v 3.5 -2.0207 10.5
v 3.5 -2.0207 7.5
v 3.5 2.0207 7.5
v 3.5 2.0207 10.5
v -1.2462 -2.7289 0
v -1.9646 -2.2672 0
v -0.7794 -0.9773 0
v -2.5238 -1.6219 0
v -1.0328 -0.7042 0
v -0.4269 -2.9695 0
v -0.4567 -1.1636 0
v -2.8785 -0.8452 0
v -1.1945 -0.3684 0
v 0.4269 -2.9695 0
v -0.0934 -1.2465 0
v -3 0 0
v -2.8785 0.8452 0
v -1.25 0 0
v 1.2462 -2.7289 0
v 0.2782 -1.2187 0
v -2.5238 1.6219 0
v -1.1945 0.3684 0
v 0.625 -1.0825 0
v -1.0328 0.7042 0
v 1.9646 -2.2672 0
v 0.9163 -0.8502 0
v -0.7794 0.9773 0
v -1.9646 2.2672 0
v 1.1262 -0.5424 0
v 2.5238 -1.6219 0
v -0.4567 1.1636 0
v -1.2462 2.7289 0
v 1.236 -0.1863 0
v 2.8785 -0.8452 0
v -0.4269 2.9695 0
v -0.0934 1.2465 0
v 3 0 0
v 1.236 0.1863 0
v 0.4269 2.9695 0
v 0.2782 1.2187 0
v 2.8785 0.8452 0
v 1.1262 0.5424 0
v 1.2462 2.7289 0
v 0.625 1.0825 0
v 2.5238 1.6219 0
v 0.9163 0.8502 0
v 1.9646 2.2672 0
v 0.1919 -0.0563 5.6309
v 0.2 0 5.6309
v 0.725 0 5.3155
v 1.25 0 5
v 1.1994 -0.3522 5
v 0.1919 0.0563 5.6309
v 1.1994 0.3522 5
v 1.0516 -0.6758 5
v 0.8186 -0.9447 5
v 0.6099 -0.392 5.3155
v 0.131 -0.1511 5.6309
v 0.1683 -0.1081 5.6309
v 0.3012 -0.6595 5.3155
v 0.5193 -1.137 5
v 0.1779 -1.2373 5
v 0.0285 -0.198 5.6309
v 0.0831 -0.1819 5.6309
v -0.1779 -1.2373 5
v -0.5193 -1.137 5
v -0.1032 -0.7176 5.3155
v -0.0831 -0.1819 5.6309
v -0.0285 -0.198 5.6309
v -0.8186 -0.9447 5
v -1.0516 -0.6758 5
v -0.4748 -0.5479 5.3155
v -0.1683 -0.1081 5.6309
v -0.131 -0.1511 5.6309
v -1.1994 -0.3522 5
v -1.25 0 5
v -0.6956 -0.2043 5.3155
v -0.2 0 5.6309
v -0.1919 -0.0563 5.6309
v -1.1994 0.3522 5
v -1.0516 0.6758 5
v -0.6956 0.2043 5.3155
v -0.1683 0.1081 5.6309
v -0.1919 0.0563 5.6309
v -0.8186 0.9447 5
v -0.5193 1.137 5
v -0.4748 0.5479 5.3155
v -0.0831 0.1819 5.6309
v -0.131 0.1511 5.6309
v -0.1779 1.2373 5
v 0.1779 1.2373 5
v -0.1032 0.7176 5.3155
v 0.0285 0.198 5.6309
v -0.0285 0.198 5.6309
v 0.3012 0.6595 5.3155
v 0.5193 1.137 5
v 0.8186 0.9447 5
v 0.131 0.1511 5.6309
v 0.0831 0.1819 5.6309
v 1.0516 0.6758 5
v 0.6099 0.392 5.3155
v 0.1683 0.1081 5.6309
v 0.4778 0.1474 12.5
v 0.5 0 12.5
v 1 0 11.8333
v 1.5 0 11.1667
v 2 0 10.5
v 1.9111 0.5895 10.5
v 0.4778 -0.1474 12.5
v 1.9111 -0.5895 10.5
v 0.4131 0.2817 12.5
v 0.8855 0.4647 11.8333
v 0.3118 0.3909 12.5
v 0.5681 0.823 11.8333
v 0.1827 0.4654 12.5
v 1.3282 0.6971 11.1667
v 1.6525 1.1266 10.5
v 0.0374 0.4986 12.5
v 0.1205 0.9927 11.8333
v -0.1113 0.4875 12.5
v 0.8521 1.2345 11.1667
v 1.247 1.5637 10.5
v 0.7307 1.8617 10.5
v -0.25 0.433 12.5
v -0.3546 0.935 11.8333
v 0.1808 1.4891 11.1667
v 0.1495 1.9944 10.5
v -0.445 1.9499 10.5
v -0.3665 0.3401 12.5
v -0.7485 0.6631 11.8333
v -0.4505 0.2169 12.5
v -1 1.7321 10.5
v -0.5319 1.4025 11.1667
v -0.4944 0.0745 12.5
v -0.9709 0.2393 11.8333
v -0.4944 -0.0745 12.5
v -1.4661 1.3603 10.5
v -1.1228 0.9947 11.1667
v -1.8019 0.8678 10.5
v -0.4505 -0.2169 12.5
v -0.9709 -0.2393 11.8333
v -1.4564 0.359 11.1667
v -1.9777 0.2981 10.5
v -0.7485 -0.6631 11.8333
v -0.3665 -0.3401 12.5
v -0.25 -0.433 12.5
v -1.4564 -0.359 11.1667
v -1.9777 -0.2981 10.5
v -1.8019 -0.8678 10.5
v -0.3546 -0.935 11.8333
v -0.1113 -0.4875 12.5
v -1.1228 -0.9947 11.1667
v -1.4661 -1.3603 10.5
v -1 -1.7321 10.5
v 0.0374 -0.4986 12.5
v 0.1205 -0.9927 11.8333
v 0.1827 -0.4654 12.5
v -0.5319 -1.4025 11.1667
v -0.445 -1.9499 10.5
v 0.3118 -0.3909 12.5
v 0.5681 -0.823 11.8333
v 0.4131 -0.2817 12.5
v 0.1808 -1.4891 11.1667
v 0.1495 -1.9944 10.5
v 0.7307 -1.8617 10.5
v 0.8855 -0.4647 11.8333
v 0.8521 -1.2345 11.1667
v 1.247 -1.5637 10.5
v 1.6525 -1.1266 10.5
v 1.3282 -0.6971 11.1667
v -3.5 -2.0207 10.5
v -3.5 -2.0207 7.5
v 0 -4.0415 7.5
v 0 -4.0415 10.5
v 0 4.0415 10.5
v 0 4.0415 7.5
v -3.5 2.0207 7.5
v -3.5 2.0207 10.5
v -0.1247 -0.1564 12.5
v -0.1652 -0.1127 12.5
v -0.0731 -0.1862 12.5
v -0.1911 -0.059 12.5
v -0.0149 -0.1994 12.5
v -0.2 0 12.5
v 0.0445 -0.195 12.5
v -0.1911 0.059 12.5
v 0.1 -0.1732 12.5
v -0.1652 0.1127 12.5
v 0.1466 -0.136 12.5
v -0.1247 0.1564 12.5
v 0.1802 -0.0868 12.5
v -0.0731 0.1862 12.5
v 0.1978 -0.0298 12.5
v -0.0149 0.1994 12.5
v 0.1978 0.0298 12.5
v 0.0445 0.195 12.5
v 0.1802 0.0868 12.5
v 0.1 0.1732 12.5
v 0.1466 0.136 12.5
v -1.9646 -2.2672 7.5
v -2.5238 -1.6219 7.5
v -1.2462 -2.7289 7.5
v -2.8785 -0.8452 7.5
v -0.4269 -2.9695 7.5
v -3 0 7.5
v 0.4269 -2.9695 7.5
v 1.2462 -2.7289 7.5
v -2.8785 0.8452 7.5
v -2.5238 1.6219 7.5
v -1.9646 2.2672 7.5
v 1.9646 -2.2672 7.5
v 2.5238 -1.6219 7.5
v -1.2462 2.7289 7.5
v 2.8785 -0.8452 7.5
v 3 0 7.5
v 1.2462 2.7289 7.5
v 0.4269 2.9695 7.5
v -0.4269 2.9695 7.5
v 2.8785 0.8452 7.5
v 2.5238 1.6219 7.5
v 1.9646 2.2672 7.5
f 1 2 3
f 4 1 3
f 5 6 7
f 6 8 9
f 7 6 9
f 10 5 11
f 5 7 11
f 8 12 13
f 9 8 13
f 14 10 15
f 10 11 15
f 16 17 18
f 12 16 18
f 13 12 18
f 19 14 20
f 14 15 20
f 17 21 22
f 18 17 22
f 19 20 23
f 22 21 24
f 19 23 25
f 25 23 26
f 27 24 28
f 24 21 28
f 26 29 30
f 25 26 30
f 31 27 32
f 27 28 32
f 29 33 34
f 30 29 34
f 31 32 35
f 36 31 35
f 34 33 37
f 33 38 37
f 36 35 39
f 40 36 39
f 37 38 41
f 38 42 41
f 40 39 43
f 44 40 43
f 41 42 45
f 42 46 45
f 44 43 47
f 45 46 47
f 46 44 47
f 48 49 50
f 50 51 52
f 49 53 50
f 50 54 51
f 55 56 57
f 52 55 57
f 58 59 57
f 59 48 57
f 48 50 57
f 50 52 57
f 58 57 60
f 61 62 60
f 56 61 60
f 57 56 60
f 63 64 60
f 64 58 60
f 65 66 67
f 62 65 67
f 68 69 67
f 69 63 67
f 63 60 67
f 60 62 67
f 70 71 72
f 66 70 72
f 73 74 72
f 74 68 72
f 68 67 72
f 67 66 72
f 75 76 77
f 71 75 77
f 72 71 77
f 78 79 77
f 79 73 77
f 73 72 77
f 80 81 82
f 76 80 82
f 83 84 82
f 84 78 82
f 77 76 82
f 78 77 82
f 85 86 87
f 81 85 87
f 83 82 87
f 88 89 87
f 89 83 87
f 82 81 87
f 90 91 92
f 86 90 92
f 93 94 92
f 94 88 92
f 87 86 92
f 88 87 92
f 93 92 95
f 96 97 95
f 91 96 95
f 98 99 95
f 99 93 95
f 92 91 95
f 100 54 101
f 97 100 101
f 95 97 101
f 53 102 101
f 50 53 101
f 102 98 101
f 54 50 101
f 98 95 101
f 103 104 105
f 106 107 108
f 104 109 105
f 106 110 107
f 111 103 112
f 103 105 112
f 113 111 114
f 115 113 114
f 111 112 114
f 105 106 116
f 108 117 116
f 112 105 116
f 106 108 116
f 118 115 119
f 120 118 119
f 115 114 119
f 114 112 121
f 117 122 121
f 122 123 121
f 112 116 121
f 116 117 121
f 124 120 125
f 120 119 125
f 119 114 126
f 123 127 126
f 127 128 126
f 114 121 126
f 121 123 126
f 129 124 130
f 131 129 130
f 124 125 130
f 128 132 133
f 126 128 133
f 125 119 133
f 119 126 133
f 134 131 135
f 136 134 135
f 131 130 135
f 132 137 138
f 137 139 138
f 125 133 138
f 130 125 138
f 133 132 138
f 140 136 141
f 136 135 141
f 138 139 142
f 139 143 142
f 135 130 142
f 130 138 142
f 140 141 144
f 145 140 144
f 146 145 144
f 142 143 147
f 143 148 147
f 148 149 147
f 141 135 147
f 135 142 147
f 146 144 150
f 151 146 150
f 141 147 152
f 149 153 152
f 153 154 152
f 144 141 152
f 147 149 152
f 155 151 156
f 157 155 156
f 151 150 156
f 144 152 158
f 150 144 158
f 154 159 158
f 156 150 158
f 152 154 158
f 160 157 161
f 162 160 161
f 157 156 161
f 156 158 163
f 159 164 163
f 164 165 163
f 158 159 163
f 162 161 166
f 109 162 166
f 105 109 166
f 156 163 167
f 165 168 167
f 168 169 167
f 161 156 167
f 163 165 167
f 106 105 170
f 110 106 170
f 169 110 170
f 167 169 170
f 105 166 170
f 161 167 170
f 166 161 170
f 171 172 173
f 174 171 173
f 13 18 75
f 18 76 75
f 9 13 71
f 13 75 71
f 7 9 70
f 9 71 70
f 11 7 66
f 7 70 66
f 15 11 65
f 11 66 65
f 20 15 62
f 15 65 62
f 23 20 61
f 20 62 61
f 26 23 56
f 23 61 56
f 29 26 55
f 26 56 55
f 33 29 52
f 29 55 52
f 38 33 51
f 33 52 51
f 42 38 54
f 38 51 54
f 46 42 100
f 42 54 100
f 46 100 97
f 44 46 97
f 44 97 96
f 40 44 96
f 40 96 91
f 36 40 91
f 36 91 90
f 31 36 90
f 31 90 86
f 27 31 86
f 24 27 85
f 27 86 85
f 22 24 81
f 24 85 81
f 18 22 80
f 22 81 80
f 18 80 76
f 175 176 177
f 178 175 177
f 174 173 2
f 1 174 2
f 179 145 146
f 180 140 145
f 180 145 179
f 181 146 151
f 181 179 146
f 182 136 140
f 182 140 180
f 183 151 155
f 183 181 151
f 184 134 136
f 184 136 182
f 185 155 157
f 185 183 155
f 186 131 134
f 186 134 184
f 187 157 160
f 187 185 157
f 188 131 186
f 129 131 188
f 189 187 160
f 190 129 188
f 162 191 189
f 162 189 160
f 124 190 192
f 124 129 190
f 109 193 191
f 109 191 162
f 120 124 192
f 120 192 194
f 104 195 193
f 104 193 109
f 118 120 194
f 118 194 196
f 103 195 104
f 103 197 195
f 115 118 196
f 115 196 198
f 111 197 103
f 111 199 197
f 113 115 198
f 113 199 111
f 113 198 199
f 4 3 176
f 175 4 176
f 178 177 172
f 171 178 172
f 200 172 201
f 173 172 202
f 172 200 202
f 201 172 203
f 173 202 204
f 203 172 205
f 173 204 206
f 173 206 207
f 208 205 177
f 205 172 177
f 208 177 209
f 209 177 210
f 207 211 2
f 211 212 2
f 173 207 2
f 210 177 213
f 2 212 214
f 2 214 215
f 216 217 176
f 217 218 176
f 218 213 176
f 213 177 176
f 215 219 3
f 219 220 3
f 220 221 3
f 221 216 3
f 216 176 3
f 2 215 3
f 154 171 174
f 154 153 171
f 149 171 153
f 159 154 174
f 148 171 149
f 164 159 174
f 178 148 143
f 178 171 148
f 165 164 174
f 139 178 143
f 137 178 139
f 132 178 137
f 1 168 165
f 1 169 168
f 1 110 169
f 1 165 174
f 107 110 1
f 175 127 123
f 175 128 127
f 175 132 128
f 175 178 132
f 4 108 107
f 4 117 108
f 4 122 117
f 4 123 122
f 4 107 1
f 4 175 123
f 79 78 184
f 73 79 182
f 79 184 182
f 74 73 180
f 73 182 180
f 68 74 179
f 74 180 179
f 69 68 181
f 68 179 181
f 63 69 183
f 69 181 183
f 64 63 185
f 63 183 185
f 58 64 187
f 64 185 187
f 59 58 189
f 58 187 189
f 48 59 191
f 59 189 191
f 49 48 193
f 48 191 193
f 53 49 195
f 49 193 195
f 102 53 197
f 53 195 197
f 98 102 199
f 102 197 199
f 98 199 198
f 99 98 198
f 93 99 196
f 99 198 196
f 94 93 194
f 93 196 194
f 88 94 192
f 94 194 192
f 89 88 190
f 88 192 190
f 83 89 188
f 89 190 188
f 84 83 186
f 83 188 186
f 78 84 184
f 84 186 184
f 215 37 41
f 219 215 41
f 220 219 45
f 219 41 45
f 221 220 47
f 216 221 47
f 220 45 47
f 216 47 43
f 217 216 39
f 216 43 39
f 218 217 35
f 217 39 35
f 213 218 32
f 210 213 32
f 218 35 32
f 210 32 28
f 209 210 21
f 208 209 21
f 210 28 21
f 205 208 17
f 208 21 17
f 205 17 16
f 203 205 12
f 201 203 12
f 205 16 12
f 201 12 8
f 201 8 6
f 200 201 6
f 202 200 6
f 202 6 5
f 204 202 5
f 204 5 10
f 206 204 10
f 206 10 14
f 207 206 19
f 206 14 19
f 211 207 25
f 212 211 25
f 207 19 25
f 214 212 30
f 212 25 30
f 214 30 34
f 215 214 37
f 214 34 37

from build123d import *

# Parameters (mm, degrees)
F1_R      = 3
F2_DEPTH  = 7.5
F3_R      = 3
F4_DEPTH  = 3
F5_R      = 2
F6_DEPTH  = 2
F7_SIZE2  = 1.99999
F7_SIZE   = 1.49999
F8_D      = 0.4
F10_D     = 2.5
F10_DEPTH = 5
F10_TIP   = 0.7510757738


# Not quite as in the source:
# - a fillet or chamfer is up to 0.001 mm smaller than in the source, because OpenCascade refuses the exact size


with BuildPart() as f2:
    # F1 (on face) → F2 (new body)
    with BuildSketch(Plane.XY):
        Circle(F1_R)
    extrude(amount=F2_DEPTH)

    # F3 (on face) → F4 (join)
    with BuildSketch(Plane.XY.offset(7.5)):
        Polygon((3.5, -2.0207259422), (3.5, 2.0207259422), (0, 4.0414518843), (-3.5, 2.0207259422), (-3.5, -2.0207259422), (0, -4.0414518843), align=None)
        Circle(F3_R, mode=Mode.SUBTRACT)
        Circle(F3_R)
    extrude(amount=F4_DEPTH)

    # F5 (on face) → F6 (join)
    with BuildSketch(Plane.XY.offset(10.5)):
        Circle(F5_R)
    extrude(amount=F6_DEPTH)

    # F7 (size 1.5 and 2 in the source; OpenCascade refuses exactly that, so slightly less here)
    f7_edges = [f2.edges().sort_by_distance(p)[0] for p in [
        (-2, 0, 12.5),
    ]]
    f7_side = f2.faces().sort_by_distance((0, 0, 12.5))[0]
    chamfer(f7_edges, length=F7_SIZE, length2=F7_SIZE2, reference=f7_side)

    # F8 (through all)
    with Locations(Plane(origin=(0, 0, 0), x_dir=(1, 0, 0), z_dir=(0, 0, -1))):
        with Locations((0, 0)):
            Hole(F8_D / 2)

    # F10
    with Locations(Plane(origin=(0, 0, 0), x_dir=(1, 0, 0), z_dir=(0, 0, -1))):
        with Locations((0, 0)):
            Hole(F10_D / 2, depth=F10_DEPTH)
            with Locations((0, 0, -(F10_DEPTH + F10_TIP / 2))):  # 118° drill point
                Cone(0, F10_D / 2, F10_TIP, mode=Mode.SUBTRACT)


solid = f2.part
